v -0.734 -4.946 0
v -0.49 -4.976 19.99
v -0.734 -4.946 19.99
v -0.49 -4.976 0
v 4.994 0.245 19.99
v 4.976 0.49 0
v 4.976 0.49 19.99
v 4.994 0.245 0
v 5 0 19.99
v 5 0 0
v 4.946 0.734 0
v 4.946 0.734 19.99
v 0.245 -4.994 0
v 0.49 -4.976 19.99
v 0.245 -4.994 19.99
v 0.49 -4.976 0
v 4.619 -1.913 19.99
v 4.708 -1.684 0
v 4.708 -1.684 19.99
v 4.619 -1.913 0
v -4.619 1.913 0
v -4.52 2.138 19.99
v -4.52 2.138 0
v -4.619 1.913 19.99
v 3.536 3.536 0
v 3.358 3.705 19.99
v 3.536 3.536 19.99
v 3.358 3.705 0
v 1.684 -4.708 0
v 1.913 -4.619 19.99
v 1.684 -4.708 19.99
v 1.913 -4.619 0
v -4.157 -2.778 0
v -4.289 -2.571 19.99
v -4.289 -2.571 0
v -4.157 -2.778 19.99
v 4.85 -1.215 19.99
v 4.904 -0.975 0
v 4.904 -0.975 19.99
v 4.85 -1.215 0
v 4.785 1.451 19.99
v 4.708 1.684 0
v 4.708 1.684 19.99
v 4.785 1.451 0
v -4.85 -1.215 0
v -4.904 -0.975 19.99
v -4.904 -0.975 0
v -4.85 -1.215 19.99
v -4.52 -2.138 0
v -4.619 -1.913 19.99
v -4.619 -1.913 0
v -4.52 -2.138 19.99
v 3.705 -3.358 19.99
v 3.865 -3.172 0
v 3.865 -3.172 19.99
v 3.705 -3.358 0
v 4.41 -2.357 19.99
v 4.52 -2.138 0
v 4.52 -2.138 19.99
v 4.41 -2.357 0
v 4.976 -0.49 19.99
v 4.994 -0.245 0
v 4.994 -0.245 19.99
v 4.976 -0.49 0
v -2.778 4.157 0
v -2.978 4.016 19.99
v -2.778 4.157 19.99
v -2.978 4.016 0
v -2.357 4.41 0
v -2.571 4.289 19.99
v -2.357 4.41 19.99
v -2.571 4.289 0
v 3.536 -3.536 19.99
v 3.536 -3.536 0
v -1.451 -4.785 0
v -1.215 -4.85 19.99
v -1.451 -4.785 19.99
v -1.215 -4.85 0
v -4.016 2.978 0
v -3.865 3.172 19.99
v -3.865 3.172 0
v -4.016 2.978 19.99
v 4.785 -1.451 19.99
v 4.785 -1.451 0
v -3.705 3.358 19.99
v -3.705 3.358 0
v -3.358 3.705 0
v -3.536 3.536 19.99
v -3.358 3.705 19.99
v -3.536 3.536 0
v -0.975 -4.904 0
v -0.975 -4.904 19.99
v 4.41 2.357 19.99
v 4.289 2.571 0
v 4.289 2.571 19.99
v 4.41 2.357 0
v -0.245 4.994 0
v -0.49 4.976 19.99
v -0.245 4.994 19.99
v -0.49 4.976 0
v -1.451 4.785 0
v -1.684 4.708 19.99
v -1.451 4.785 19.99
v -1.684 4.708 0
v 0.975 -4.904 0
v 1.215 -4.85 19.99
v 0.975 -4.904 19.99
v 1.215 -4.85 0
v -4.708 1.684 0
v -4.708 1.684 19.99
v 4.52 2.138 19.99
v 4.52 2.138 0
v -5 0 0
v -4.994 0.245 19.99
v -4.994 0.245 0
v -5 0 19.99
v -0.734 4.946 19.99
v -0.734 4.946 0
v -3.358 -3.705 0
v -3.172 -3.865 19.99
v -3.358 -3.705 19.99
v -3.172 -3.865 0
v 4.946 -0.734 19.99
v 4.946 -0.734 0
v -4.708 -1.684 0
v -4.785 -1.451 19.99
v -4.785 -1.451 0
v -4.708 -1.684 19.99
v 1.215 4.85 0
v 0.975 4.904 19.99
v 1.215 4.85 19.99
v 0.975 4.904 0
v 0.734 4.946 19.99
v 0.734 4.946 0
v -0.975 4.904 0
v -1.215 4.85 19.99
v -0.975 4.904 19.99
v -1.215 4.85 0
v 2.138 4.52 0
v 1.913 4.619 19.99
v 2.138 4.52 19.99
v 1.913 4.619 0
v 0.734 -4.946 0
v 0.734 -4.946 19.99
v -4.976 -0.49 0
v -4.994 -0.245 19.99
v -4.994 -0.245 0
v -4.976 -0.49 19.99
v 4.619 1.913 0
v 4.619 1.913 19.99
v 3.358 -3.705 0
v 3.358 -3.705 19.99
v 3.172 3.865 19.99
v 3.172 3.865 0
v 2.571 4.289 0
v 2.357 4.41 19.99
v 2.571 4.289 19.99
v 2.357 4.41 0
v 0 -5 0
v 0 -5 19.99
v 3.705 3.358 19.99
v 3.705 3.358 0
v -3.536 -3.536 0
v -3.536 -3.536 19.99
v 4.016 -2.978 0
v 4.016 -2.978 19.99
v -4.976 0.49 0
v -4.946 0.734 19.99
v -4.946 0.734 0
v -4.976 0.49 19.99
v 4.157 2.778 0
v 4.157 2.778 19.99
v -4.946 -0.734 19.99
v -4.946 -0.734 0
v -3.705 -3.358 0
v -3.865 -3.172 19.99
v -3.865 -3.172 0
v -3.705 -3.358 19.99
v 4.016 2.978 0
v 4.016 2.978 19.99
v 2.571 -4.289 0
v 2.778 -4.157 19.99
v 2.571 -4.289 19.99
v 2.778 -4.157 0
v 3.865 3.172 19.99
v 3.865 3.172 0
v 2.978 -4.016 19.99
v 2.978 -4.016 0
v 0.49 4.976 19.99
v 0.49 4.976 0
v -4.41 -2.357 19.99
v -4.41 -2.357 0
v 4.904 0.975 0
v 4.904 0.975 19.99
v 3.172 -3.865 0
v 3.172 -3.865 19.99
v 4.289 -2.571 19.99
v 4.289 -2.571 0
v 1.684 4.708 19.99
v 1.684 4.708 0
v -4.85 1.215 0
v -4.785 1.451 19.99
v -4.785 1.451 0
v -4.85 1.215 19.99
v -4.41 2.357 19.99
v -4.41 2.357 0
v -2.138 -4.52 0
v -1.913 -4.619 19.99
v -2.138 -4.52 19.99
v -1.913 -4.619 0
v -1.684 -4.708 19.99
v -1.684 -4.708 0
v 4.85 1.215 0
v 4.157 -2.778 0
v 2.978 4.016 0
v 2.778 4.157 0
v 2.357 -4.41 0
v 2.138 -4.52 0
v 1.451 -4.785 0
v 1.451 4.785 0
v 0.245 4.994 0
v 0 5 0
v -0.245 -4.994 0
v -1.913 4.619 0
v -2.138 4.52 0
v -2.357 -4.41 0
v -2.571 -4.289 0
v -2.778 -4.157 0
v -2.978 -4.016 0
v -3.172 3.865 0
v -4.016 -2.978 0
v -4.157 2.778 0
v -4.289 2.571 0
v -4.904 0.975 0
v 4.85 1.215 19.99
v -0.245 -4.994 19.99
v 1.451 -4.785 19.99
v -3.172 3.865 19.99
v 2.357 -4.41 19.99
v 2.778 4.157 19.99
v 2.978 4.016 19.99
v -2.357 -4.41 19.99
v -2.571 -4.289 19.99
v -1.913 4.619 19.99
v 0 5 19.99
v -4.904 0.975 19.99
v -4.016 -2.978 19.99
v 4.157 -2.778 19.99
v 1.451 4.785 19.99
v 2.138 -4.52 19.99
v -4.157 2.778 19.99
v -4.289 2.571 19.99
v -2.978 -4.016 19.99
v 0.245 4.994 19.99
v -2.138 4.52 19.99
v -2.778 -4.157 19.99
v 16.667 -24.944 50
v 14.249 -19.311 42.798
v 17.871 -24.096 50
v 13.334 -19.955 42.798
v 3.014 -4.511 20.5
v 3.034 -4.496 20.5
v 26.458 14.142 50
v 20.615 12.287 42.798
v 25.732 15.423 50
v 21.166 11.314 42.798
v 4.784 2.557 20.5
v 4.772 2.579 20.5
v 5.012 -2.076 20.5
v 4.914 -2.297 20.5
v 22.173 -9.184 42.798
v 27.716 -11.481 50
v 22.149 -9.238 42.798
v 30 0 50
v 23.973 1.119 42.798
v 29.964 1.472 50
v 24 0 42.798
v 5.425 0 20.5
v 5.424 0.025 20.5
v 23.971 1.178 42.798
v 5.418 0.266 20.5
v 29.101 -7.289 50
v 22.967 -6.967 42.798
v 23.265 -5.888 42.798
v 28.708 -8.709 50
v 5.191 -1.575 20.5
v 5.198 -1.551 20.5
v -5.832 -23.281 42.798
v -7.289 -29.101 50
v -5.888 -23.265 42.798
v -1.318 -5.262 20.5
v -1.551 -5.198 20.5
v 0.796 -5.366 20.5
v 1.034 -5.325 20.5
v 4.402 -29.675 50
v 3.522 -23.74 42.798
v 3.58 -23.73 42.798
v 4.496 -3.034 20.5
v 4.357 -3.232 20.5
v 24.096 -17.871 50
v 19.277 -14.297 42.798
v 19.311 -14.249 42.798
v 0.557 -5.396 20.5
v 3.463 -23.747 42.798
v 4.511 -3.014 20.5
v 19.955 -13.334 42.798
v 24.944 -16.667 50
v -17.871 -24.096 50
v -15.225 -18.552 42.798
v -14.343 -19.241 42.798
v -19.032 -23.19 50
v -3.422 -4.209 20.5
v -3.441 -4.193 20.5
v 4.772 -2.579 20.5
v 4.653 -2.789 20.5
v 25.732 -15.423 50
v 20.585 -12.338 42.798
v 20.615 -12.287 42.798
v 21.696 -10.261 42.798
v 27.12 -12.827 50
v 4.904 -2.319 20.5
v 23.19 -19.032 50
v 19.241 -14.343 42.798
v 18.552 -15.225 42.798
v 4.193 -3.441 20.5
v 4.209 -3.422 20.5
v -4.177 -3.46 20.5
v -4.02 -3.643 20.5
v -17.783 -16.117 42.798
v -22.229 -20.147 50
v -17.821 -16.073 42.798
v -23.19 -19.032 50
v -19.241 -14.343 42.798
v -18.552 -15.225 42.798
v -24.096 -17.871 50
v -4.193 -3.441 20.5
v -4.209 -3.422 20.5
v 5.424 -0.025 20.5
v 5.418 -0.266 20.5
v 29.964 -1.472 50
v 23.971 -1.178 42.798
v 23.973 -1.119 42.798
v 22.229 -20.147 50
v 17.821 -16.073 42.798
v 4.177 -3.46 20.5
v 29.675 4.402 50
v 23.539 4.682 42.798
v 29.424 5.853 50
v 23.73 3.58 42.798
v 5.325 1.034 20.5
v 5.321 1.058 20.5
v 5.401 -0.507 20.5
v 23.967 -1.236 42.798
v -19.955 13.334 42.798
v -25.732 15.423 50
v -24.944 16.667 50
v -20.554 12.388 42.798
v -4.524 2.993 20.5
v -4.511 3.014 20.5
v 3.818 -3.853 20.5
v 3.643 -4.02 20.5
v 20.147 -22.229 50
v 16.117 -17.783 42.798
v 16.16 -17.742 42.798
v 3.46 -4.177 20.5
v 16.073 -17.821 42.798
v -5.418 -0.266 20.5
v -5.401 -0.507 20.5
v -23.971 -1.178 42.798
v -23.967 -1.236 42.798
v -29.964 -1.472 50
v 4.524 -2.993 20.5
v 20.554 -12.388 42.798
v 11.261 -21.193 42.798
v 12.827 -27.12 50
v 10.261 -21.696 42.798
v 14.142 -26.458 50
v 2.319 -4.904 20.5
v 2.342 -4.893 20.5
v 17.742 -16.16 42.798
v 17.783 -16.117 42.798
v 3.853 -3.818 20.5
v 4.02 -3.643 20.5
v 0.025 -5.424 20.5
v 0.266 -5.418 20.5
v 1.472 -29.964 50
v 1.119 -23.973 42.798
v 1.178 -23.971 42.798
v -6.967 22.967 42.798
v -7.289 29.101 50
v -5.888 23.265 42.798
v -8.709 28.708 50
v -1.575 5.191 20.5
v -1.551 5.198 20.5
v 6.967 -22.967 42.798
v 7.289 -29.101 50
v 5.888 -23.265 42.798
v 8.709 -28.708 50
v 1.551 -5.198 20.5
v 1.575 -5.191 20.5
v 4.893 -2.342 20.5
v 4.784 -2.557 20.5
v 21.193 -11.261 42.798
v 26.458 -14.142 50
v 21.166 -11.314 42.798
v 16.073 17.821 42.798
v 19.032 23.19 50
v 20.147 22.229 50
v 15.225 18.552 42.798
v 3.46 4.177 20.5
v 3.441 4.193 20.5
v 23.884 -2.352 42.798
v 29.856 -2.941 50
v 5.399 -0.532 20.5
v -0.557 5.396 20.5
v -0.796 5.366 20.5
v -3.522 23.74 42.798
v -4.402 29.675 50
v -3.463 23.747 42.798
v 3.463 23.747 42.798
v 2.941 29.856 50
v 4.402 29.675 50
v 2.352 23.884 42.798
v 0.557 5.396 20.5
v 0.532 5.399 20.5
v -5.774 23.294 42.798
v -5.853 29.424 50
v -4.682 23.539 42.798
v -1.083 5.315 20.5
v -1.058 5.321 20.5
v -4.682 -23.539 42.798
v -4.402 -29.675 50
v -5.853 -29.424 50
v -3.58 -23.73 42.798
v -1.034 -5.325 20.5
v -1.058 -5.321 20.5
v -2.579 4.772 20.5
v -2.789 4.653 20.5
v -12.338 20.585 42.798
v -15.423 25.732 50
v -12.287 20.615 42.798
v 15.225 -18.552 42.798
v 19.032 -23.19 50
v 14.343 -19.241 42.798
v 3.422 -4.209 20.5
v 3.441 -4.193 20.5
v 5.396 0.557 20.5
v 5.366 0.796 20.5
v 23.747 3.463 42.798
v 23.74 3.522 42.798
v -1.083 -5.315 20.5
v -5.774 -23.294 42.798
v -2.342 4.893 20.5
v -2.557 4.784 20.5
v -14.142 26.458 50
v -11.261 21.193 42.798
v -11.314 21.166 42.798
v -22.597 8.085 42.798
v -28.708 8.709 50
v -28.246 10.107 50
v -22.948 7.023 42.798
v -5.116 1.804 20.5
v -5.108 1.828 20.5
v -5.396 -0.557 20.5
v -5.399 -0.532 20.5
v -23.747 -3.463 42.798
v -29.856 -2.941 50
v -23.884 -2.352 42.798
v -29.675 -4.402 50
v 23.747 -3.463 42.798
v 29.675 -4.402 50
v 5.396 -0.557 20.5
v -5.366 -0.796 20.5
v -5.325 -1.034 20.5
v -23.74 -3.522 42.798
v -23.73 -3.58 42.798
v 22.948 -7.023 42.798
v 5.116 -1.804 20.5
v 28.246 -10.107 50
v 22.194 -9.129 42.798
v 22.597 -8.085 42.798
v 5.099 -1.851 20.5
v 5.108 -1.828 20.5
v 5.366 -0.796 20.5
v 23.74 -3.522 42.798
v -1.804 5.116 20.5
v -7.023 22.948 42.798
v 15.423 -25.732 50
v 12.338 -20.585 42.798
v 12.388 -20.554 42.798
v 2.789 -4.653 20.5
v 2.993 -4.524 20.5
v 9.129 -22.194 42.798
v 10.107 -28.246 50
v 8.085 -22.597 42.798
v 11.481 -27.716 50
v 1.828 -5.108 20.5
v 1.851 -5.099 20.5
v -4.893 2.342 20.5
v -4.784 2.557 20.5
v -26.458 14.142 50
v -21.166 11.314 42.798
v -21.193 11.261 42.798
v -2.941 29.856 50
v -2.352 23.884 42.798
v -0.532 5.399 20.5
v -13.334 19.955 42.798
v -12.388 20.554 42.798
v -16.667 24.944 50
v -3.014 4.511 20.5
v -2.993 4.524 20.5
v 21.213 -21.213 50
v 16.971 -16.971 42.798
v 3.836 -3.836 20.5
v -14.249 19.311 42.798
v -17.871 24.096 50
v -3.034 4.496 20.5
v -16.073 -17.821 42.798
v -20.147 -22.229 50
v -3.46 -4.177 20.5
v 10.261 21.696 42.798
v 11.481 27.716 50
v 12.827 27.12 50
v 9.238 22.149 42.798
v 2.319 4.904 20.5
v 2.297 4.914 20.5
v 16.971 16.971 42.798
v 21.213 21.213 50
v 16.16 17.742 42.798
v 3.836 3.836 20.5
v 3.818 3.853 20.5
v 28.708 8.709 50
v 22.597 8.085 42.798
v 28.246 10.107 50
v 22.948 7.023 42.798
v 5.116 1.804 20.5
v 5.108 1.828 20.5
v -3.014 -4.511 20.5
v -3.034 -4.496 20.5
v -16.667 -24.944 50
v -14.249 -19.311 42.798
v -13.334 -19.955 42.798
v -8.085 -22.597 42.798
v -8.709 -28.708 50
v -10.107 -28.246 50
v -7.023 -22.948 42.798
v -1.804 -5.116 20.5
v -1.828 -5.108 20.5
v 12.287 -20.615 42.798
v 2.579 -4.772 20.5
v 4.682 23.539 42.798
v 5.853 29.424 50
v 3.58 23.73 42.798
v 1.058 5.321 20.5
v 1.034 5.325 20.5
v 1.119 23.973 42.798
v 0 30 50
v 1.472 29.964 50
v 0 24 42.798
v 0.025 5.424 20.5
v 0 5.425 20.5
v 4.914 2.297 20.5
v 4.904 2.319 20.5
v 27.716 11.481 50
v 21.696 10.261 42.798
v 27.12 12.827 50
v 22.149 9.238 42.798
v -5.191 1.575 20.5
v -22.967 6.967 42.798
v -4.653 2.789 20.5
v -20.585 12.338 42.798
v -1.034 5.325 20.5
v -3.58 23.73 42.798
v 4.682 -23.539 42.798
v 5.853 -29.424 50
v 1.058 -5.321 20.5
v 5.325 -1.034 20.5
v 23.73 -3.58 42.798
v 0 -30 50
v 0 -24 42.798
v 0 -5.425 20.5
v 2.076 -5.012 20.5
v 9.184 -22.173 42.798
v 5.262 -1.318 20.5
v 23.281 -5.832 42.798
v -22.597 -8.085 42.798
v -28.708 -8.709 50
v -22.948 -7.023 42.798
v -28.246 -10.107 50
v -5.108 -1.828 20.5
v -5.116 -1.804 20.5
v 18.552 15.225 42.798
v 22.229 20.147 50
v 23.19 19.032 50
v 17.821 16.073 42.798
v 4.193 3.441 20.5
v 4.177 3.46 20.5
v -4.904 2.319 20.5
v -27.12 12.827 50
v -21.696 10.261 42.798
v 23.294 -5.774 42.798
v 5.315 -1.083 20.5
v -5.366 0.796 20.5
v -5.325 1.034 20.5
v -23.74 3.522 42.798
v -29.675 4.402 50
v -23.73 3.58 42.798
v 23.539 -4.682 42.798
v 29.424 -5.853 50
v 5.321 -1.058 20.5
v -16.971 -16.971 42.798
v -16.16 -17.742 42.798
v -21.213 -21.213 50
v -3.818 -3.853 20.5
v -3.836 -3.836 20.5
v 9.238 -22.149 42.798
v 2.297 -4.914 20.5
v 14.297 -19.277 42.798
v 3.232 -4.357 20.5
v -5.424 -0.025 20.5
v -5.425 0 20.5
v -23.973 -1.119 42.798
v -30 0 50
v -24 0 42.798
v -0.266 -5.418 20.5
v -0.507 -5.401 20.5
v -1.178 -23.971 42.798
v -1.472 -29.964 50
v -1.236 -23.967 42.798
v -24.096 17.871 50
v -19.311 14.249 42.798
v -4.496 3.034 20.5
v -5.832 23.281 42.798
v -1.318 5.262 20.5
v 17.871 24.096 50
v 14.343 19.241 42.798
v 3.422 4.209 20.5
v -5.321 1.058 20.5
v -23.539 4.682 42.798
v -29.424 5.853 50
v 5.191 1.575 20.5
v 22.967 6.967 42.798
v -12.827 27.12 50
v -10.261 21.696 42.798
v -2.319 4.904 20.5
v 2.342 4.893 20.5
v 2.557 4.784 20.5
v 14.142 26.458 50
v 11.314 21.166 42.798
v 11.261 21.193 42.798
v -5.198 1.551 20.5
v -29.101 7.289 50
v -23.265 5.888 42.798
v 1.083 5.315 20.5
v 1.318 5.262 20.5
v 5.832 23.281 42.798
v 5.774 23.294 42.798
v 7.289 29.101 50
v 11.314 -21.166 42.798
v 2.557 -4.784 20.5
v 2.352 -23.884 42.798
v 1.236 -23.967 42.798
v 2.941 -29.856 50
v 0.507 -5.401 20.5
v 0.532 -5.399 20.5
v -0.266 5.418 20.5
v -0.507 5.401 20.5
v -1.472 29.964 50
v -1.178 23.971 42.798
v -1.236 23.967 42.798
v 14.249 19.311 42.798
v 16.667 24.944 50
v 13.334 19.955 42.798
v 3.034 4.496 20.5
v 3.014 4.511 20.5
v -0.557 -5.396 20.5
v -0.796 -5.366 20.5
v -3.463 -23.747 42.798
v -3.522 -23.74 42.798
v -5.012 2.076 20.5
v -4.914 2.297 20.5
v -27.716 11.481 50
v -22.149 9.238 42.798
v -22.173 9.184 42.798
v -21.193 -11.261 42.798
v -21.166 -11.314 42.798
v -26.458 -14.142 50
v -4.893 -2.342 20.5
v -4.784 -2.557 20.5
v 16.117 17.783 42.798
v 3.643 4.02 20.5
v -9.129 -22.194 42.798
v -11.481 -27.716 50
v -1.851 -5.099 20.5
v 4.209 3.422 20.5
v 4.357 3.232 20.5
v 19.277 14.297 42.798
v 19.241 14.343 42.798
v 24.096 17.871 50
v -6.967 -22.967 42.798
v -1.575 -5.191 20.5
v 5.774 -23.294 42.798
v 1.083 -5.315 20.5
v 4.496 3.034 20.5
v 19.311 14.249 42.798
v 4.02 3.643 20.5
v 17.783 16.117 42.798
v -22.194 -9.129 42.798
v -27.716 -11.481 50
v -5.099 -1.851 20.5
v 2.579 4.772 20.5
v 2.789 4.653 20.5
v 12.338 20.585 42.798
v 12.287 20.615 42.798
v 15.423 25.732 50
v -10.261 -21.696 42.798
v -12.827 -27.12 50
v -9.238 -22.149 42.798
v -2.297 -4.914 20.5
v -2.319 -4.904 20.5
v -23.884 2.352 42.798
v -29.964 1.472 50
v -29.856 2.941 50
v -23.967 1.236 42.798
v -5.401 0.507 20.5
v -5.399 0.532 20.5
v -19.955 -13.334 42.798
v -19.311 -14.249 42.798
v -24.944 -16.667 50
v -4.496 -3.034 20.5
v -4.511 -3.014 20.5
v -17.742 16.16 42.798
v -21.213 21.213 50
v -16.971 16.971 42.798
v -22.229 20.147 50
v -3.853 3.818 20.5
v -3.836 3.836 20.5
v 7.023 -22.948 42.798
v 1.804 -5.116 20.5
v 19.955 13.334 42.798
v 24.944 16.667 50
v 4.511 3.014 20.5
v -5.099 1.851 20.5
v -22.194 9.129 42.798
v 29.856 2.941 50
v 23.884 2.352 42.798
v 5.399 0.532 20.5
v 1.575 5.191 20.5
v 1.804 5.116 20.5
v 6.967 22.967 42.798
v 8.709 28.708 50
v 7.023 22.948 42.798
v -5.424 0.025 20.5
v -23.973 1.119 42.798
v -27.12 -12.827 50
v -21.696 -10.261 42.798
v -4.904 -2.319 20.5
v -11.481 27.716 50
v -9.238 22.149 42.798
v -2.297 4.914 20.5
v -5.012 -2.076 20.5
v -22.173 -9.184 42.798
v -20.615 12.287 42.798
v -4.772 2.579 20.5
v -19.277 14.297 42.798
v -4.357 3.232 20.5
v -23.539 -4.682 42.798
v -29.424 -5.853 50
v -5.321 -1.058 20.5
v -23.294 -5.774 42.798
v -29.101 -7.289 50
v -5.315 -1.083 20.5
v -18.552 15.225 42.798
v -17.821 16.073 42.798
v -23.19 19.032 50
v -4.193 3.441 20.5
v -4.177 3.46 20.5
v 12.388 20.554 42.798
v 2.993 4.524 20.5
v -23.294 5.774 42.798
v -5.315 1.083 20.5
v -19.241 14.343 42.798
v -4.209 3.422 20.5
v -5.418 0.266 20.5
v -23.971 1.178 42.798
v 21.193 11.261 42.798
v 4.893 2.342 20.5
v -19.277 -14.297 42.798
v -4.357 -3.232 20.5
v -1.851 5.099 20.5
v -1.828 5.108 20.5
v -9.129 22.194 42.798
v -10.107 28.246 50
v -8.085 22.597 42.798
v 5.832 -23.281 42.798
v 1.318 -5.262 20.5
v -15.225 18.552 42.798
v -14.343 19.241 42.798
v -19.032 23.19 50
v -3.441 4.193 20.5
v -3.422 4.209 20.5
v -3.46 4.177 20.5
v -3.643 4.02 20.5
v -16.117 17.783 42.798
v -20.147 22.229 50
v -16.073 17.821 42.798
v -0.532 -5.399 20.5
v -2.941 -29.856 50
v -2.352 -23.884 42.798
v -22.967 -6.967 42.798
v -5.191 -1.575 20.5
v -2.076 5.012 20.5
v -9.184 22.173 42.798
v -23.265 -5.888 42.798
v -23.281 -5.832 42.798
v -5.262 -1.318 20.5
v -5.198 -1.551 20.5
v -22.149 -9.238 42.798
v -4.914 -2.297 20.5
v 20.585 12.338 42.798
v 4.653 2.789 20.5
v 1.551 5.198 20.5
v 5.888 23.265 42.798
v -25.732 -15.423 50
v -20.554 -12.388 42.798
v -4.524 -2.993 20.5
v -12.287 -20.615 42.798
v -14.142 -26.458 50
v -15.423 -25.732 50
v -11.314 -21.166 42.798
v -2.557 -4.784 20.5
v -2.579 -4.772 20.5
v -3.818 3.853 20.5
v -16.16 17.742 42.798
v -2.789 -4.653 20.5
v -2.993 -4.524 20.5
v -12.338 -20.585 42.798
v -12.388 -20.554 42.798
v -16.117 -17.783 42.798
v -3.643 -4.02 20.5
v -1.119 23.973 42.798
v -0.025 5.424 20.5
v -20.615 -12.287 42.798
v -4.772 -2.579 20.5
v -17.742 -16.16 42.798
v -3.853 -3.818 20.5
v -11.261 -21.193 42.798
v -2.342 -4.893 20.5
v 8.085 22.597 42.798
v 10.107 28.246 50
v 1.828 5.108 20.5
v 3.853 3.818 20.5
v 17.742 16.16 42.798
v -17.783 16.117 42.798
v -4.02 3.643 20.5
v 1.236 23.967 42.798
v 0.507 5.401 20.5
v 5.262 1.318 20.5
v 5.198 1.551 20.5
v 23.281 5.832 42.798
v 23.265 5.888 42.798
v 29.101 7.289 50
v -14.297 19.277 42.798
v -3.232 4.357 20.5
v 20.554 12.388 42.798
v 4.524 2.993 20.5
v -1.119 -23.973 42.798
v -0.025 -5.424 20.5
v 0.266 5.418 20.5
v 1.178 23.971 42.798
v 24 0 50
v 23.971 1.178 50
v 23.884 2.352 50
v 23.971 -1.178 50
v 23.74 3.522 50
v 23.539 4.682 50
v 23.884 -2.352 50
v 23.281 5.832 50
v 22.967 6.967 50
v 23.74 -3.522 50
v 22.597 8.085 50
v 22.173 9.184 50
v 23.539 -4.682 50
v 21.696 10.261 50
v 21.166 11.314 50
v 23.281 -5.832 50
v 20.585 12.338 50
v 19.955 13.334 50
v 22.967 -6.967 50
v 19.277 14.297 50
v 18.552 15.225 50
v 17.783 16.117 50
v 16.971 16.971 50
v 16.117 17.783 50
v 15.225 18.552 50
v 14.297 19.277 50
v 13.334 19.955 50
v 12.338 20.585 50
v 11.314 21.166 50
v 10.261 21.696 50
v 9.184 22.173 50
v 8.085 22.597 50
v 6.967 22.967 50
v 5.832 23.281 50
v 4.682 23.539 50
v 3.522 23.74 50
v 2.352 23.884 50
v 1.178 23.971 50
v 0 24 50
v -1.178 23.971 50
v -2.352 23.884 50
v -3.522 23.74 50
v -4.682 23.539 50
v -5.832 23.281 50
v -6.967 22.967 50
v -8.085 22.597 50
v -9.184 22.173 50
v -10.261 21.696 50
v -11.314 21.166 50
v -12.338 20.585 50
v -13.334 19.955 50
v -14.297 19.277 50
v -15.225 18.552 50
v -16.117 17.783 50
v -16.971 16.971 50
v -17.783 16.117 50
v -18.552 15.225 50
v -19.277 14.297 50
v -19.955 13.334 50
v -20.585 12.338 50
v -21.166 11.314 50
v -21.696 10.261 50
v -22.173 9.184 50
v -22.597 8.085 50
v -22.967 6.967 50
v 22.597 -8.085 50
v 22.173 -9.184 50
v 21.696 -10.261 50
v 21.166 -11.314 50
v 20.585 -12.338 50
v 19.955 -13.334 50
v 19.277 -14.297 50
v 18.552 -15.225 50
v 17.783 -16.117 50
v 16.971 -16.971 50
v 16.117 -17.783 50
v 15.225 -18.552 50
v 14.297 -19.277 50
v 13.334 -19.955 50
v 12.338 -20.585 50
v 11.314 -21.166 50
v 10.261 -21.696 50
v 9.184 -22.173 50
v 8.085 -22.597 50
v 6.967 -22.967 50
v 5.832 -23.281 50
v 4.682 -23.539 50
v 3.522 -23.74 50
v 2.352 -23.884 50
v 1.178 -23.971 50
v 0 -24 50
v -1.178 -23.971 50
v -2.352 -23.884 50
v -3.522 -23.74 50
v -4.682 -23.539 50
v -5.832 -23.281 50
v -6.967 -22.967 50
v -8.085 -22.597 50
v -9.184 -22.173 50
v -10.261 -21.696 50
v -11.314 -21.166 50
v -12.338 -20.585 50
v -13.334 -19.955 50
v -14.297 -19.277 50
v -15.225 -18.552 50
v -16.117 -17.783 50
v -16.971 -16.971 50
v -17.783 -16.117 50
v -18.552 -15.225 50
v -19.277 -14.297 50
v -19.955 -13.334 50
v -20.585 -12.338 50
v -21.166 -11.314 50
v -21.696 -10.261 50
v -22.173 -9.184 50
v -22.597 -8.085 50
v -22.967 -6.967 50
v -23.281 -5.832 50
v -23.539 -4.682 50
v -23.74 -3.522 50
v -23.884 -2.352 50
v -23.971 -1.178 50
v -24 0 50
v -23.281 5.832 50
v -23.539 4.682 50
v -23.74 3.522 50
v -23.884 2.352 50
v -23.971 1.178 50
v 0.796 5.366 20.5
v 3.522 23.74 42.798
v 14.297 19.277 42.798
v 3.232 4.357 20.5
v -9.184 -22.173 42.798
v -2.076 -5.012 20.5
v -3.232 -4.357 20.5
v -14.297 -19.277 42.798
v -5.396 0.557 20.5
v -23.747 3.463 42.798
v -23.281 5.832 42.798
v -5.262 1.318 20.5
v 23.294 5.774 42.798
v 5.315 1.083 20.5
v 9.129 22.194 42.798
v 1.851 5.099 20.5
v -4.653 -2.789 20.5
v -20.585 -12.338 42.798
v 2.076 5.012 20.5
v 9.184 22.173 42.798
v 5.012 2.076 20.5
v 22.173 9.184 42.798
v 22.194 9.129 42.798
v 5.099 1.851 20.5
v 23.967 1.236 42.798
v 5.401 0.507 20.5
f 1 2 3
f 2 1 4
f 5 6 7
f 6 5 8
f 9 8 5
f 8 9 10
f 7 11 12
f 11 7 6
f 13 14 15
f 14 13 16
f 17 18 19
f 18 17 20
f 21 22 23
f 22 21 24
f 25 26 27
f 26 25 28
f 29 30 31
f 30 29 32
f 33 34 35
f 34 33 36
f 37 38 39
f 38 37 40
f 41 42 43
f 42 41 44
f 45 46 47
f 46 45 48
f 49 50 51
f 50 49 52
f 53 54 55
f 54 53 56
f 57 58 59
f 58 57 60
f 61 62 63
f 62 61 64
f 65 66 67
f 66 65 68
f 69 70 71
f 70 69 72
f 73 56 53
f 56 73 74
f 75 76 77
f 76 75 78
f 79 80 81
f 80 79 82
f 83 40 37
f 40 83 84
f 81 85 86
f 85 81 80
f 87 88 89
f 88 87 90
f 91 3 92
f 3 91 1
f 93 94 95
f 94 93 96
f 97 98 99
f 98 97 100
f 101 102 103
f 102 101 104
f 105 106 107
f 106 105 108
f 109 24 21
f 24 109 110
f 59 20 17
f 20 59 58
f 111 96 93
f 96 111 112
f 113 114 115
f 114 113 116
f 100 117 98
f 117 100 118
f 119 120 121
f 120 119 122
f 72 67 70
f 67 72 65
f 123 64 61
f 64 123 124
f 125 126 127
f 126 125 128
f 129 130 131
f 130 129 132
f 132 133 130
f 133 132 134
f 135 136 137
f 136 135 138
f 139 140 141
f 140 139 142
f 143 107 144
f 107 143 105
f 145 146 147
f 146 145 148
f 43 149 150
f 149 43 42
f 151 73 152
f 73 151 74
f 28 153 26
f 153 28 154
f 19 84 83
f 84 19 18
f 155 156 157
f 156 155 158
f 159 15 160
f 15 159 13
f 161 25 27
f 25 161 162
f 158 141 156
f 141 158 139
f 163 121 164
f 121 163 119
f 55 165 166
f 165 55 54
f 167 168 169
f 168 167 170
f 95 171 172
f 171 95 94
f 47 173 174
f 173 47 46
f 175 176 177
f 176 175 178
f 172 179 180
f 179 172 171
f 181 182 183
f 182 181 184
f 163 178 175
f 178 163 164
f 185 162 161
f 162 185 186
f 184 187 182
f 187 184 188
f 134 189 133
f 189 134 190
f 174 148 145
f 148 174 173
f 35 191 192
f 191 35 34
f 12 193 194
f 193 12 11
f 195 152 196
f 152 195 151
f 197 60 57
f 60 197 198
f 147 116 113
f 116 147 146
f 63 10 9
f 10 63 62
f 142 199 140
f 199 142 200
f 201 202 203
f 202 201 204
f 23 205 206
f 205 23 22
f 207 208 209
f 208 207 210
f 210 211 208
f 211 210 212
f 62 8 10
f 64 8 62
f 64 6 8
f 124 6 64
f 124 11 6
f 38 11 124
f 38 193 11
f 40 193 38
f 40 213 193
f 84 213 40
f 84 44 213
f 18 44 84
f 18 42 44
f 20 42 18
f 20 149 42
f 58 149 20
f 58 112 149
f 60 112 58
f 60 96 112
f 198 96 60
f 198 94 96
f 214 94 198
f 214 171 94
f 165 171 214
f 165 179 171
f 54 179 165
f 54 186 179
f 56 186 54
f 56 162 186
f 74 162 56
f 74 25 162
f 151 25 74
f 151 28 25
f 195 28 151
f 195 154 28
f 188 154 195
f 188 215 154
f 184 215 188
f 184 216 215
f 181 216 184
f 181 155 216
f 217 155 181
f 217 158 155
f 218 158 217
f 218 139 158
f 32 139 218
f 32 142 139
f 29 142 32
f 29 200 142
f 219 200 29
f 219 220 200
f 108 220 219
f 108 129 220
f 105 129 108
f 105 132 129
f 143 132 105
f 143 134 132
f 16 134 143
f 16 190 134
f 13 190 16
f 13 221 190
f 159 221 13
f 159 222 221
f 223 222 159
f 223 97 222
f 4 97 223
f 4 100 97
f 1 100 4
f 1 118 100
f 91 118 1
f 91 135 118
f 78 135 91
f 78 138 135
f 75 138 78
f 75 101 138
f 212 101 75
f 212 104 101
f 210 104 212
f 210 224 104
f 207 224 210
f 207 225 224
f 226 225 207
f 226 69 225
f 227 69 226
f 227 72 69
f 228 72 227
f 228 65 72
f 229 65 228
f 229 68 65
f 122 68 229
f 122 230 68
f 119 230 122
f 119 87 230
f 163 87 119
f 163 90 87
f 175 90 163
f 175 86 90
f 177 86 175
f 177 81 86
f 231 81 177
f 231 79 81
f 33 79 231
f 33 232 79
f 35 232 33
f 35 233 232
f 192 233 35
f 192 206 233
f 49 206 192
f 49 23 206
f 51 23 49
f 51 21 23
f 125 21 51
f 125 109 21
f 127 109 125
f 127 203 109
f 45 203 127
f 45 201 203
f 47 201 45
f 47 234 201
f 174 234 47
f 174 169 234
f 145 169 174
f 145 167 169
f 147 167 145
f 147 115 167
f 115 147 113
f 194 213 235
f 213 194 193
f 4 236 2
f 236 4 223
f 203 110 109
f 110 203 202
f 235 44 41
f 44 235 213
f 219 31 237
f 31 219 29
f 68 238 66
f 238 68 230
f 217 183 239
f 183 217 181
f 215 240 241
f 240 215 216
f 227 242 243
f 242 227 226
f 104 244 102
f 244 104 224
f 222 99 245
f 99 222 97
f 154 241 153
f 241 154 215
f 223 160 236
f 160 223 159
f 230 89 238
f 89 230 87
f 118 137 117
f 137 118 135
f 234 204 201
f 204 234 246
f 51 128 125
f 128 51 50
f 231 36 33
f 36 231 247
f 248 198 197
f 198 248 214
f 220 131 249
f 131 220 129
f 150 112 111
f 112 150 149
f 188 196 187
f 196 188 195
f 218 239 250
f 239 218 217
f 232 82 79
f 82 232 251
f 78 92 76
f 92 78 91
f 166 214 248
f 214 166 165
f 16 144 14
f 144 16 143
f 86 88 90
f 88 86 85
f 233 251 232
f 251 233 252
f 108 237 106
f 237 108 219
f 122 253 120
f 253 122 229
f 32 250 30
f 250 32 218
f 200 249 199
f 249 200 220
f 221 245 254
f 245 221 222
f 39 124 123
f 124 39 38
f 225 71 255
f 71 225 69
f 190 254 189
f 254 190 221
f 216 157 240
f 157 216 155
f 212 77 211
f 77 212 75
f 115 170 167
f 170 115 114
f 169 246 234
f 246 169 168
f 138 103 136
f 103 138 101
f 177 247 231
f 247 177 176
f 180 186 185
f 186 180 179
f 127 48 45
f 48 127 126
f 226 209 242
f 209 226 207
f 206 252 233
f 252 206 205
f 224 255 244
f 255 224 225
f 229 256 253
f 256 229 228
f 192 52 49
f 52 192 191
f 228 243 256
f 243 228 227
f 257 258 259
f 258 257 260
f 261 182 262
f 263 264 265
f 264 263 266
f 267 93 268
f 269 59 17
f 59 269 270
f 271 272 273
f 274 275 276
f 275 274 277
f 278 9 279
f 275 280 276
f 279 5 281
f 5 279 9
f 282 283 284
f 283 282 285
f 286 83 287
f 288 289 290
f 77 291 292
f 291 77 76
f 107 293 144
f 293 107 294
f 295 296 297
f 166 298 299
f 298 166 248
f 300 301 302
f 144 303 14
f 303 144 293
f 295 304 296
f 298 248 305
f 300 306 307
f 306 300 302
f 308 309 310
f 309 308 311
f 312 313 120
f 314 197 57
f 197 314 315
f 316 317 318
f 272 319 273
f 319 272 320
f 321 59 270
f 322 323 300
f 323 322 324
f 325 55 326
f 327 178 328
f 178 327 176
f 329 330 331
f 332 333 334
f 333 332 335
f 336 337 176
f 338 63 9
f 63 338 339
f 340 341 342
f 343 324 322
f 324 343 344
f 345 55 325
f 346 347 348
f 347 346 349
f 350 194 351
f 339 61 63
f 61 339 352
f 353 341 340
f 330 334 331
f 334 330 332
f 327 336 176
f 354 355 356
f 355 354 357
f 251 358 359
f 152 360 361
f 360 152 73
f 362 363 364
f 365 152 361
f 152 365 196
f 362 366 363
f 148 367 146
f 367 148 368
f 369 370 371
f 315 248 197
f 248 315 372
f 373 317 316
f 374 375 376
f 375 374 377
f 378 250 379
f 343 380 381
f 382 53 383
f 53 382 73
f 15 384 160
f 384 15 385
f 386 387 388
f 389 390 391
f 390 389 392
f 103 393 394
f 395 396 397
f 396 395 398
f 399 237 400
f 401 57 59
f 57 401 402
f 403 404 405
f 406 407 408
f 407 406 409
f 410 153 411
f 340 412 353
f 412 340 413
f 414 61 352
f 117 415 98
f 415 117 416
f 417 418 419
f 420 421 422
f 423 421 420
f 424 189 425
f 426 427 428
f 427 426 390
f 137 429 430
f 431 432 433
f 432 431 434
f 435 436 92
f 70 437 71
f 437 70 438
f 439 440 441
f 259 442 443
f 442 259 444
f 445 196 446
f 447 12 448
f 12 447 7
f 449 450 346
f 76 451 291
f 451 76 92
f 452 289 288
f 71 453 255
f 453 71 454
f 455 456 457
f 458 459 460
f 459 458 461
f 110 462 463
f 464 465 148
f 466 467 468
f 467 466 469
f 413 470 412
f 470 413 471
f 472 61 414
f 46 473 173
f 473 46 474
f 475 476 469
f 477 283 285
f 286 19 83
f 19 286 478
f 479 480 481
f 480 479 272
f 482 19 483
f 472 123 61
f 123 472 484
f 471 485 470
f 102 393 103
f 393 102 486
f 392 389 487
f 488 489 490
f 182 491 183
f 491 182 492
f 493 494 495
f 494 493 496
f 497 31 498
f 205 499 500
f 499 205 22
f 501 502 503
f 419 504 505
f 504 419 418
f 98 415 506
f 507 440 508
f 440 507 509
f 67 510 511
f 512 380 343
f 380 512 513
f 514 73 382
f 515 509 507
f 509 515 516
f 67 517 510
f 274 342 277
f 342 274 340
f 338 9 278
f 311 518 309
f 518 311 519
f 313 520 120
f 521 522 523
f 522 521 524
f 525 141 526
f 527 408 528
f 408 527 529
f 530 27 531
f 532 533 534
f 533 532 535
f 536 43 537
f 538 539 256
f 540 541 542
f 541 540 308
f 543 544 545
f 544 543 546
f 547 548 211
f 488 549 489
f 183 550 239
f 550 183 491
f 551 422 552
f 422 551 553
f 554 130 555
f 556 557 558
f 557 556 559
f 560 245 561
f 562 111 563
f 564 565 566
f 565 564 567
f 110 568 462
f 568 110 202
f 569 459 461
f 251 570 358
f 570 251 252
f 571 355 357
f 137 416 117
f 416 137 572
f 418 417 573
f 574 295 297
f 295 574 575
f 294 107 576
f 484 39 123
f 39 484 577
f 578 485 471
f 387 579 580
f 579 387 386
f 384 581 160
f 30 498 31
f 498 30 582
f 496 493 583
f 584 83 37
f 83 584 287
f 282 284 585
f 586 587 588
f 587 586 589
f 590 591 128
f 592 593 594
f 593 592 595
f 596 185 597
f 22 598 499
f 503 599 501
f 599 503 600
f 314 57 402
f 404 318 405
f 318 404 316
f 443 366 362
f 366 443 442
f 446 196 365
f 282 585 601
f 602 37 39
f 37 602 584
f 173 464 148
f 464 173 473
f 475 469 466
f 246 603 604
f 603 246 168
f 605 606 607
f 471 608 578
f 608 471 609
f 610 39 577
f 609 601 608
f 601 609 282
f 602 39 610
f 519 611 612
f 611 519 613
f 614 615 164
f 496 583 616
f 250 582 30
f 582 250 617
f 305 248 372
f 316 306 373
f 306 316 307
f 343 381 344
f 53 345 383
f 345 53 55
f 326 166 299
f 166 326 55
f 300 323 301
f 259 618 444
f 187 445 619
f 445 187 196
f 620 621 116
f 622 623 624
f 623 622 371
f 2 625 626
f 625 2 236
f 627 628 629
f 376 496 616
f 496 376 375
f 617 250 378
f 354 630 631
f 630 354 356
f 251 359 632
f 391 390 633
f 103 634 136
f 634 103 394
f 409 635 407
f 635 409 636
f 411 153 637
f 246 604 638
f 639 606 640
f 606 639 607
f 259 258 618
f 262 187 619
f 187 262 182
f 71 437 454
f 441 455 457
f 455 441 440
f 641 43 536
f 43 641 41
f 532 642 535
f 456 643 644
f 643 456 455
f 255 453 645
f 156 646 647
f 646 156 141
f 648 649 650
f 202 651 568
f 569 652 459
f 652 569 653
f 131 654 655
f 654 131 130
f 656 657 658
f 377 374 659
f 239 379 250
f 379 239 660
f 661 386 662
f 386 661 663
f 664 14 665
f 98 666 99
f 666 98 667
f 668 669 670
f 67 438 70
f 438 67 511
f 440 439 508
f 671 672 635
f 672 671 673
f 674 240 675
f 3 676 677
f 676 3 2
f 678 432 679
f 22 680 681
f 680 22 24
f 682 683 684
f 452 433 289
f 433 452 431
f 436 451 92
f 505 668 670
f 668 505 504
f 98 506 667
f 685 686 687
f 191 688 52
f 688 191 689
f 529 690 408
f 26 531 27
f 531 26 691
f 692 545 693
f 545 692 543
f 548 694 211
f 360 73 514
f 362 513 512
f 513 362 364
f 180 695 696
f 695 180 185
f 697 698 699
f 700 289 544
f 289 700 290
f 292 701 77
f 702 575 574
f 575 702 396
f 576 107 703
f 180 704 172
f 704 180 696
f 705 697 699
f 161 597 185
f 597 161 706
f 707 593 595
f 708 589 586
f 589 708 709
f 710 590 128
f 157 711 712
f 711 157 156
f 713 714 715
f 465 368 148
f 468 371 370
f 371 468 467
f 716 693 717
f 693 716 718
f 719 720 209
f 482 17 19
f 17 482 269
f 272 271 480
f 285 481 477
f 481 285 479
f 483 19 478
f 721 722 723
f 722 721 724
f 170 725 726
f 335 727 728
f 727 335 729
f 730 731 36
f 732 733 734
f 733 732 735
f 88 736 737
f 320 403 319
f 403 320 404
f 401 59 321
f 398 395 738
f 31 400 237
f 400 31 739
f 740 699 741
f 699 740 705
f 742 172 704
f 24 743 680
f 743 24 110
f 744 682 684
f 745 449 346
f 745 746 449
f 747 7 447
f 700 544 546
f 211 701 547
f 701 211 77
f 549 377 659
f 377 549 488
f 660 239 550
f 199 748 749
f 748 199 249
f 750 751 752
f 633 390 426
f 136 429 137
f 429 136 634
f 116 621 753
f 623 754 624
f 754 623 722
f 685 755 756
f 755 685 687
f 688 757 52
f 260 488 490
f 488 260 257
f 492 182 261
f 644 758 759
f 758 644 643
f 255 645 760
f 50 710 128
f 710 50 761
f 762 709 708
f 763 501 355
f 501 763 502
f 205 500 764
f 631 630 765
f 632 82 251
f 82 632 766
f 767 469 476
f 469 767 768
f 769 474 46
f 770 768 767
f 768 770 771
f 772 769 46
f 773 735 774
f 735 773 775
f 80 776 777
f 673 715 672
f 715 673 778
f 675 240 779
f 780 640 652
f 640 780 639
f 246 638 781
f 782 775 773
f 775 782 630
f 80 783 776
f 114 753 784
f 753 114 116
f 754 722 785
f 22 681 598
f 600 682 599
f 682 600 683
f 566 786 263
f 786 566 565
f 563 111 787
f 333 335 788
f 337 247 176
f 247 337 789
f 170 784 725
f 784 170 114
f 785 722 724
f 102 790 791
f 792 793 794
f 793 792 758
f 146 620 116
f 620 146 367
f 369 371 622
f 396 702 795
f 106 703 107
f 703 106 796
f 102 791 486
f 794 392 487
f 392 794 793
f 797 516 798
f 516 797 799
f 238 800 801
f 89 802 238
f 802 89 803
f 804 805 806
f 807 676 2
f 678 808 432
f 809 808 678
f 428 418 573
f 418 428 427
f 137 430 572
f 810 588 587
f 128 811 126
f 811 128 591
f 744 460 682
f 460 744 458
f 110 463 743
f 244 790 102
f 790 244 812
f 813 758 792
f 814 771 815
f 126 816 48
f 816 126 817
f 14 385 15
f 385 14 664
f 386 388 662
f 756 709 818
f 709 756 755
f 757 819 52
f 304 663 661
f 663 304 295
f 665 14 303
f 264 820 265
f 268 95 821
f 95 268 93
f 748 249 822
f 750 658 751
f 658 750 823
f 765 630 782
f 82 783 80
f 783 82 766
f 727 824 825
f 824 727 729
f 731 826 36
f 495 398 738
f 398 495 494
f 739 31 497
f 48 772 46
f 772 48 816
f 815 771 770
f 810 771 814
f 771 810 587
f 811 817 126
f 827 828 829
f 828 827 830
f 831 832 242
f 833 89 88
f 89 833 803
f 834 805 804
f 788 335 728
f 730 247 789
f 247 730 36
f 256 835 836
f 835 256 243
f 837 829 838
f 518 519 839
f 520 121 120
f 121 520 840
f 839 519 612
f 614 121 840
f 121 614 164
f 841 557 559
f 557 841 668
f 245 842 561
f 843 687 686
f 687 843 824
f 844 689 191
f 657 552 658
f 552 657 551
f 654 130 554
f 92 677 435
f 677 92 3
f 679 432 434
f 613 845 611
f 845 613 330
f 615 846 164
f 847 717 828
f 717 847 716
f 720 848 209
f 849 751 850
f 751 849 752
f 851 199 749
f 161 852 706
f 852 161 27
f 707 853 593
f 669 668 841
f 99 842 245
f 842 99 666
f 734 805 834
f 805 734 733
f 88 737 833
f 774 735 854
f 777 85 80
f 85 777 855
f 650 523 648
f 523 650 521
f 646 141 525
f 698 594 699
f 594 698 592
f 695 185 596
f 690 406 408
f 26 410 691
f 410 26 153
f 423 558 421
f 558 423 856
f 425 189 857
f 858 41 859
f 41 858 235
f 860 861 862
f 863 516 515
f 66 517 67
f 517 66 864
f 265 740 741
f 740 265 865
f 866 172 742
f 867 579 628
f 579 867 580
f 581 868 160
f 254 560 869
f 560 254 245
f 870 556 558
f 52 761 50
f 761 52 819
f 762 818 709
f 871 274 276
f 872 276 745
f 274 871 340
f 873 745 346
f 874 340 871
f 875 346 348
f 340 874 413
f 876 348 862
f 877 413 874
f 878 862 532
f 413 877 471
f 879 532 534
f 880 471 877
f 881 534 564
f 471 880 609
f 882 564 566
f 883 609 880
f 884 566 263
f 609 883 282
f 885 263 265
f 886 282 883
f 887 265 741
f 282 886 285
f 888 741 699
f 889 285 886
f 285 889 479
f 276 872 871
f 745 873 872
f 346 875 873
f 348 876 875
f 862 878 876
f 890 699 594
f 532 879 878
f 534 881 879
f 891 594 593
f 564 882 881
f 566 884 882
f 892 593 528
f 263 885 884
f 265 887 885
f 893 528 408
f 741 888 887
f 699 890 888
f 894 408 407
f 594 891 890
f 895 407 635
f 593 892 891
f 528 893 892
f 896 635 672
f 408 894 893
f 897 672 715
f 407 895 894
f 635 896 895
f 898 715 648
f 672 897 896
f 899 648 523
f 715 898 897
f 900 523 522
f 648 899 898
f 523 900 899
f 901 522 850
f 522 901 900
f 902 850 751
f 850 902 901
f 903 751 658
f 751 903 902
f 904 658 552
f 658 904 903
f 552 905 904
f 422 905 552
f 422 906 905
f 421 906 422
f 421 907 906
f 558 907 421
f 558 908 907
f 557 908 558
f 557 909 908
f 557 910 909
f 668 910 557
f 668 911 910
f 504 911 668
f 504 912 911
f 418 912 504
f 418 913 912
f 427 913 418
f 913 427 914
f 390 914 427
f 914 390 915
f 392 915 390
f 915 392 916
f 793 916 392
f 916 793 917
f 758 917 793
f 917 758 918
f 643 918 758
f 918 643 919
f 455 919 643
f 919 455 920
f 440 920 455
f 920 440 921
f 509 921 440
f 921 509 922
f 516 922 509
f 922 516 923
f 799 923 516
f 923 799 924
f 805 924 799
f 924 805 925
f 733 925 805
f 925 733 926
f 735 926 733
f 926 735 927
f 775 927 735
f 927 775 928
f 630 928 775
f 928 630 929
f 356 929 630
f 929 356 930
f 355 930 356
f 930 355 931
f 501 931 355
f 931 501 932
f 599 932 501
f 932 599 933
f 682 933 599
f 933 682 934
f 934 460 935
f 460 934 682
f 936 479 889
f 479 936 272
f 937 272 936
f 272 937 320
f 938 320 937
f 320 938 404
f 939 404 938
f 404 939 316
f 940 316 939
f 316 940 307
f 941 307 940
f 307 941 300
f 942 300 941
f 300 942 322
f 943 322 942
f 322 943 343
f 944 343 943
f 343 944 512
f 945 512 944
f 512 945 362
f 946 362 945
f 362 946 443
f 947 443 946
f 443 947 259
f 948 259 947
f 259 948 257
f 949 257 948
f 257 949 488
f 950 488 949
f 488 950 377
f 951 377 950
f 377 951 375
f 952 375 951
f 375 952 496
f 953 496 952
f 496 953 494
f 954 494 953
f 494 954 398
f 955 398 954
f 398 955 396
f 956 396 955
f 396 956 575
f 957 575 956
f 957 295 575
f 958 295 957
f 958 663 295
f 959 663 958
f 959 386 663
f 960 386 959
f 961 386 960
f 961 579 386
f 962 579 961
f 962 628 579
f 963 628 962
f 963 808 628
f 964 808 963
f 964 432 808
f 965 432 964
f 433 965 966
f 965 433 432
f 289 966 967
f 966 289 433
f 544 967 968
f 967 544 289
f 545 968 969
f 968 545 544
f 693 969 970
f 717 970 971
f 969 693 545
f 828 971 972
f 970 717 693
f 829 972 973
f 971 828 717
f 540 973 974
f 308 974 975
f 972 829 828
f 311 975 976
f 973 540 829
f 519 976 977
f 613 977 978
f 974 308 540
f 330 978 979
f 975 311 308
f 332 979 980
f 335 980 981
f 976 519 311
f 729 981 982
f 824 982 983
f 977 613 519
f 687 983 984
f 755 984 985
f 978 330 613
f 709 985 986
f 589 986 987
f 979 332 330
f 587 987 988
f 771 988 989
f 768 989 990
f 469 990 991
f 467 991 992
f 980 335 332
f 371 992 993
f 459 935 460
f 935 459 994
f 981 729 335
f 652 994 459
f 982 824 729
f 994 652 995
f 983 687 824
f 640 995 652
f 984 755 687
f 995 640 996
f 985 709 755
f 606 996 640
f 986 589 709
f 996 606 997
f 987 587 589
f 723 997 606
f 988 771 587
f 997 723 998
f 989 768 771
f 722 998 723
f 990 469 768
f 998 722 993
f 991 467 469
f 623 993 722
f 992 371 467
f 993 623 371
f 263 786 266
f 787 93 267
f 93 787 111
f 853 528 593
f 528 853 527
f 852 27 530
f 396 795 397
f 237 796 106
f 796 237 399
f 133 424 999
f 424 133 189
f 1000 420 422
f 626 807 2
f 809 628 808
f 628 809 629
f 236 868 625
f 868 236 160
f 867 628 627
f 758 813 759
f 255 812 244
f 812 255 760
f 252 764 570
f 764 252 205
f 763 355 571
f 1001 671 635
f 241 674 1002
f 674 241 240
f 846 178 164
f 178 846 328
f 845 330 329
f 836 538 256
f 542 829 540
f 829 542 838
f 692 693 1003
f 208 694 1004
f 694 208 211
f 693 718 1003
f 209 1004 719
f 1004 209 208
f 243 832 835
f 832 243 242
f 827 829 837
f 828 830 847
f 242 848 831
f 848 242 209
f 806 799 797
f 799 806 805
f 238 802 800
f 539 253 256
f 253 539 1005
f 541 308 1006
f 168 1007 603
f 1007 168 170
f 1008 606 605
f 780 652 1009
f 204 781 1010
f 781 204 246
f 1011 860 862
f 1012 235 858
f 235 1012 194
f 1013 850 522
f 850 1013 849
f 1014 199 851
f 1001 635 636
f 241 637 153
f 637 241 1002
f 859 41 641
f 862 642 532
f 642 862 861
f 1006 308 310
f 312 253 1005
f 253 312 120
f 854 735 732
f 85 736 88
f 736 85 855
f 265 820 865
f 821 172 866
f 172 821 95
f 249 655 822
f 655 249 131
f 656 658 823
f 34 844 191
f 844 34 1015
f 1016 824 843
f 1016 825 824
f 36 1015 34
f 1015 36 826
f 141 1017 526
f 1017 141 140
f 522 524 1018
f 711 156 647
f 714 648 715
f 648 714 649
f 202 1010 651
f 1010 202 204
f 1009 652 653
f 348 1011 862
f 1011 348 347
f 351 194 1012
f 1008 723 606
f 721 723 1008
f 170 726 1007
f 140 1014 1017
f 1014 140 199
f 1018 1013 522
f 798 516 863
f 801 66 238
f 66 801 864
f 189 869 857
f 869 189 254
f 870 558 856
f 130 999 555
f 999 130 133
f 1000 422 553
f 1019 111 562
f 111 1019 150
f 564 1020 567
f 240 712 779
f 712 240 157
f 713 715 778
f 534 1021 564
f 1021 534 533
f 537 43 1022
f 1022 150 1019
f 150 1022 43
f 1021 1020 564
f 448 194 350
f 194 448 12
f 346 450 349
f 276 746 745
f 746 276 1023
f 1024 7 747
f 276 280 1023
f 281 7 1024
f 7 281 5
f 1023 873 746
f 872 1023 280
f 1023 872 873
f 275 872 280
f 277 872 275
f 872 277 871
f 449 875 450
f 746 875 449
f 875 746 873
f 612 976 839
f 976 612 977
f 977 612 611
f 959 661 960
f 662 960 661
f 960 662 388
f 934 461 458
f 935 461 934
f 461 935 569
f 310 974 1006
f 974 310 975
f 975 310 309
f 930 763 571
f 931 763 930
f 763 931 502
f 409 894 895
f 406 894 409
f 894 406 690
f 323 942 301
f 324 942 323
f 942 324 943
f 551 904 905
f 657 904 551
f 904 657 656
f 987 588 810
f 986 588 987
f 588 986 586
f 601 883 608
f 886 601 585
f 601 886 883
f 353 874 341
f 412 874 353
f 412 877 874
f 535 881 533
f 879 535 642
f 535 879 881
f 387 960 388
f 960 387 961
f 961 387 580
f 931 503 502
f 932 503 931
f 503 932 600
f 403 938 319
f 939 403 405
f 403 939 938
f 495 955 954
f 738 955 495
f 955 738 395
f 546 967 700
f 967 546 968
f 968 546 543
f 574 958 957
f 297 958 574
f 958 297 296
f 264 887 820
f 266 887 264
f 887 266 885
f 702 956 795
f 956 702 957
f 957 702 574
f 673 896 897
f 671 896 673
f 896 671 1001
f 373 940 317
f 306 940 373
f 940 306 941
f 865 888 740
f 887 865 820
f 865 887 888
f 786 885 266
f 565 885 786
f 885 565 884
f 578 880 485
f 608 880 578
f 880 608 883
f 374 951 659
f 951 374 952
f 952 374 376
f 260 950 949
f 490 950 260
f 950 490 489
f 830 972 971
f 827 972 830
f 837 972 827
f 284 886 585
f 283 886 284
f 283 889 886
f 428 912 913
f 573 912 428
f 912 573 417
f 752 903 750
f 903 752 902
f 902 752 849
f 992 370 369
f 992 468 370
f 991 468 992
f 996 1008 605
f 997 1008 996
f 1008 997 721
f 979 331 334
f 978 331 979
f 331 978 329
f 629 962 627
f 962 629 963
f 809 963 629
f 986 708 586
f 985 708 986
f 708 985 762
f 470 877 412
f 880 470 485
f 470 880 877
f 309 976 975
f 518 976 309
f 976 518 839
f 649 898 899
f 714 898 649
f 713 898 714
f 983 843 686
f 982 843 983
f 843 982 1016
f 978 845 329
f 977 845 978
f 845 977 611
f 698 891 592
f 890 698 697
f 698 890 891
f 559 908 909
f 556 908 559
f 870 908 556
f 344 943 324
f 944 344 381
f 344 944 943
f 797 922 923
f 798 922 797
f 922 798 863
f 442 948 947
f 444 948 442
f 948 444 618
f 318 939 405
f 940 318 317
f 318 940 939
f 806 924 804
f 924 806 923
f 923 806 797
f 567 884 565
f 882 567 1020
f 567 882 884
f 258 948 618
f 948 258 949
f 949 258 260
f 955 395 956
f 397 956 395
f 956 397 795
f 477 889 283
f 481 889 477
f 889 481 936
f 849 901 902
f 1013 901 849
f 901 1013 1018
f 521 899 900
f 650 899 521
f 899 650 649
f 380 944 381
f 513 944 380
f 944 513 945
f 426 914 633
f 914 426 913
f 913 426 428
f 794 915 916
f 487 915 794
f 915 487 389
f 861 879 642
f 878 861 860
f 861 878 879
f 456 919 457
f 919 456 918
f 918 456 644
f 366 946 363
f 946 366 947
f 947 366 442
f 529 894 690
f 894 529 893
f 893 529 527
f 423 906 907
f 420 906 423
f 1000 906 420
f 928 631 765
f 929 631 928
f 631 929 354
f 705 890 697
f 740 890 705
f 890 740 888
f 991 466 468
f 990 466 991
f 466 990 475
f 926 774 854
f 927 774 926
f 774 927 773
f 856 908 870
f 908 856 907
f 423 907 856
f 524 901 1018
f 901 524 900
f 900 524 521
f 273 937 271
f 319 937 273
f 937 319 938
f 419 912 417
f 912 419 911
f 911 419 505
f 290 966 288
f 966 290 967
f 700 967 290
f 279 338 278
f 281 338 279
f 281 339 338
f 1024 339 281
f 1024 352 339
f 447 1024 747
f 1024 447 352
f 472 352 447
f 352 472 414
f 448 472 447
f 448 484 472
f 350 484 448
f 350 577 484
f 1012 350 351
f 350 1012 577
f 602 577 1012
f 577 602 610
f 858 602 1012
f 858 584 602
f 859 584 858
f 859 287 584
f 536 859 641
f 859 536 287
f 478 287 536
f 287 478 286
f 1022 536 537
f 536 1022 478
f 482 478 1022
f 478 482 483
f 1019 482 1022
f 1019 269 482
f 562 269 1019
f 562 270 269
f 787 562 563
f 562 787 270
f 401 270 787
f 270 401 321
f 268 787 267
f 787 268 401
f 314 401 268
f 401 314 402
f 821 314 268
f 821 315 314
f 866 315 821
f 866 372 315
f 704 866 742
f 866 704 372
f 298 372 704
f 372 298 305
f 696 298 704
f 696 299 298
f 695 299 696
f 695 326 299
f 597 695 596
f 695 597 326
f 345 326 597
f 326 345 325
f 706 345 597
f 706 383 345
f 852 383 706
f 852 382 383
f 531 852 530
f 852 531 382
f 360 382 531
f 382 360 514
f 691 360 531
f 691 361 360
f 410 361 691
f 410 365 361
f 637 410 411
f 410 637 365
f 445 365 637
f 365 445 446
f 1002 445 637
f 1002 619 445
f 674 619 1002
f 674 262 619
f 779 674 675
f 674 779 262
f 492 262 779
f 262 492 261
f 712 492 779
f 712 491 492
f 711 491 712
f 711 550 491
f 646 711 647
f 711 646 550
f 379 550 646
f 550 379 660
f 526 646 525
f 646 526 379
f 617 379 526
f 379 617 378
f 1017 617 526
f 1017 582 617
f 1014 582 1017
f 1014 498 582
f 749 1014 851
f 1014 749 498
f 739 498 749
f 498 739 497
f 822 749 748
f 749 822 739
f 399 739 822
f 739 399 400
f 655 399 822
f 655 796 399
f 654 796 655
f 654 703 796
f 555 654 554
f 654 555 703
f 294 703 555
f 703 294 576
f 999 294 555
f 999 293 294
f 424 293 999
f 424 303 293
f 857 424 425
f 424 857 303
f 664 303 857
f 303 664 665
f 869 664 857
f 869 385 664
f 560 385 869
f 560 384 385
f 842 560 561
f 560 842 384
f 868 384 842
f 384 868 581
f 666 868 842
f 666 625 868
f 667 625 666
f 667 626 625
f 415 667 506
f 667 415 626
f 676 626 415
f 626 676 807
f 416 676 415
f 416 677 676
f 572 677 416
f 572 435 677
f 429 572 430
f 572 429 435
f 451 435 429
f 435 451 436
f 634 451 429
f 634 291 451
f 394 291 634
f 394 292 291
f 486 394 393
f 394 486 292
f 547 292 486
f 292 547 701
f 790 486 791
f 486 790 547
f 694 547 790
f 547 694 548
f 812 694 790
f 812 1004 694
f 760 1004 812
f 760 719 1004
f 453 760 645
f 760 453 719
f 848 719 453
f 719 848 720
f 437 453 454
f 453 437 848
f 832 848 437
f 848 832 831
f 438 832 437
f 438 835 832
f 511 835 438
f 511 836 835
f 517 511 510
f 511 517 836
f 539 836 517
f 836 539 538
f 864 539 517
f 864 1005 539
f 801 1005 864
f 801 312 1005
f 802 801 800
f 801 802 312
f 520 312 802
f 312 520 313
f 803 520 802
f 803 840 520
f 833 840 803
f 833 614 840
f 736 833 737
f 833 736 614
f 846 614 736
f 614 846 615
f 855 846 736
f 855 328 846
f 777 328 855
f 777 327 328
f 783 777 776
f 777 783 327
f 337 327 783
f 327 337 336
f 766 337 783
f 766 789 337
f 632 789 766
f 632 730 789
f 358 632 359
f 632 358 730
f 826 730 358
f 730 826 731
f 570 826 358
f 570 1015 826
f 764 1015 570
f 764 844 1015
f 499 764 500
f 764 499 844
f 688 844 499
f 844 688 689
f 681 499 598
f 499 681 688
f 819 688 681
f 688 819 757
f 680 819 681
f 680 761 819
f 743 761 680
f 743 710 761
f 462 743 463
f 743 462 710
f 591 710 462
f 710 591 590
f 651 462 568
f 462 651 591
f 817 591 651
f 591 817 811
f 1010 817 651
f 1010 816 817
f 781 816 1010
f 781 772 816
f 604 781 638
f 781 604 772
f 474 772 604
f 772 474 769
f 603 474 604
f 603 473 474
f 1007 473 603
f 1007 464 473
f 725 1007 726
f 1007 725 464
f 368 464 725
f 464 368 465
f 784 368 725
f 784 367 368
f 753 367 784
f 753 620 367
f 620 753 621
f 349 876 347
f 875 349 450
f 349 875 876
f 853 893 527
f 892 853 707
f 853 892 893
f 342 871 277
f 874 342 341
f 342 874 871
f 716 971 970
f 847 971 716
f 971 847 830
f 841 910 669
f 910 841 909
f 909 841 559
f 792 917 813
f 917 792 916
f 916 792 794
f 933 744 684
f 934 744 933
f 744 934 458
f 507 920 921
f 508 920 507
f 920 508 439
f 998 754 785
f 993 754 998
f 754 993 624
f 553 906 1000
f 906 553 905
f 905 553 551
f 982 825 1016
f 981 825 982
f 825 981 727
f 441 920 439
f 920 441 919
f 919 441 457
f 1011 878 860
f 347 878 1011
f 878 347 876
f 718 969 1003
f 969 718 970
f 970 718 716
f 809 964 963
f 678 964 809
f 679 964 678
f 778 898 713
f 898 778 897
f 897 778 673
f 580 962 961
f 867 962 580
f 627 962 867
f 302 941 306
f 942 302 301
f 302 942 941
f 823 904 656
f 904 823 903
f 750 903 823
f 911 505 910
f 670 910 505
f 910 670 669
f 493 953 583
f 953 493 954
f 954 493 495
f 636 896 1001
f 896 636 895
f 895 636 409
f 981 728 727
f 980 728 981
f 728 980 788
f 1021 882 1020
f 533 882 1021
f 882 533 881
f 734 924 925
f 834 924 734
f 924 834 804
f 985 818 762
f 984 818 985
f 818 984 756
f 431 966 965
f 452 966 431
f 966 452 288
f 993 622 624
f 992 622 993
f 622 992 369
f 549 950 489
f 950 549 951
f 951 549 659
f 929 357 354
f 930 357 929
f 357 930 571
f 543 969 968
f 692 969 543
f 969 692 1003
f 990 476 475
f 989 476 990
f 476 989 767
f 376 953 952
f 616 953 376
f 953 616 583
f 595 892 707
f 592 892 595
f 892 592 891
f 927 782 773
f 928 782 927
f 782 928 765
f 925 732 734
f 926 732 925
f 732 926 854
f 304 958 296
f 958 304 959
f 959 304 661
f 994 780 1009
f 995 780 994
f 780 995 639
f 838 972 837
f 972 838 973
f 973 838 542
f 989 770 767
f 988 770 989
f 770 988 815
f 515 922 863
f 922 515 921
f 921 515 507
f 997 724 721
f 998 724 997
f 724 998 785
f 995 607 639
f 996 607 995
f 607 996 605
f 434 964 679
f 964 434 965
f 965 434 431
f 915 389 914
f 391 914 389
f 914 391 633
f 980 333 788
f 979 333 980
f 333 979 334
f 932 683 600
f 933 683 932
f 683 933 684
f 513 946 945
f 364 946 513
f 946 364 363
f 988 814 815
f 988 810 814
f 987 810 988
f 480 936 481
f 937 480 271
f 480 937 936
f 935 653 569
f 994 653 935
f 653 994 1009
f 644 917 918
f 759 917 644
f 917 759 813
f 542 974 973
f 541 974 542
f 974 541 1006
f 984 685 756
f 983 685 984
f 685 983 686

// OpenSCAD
// Lab funnel - printed upright, open at top and bottom
// Units: mm

// ---- Parameters ----
spout_od      = 10;    // spout outer diameter
spout_h       = 20;    // spout height (z = 0 to 20)
cone_od_top   = 60;    // cone rim outer diameter (z = 50)
cone_h        = 30;    // cone height (z = 20 to 50)
wall          = 1.6;   // wall thickness everywhere
eps           = 0.5;   // cutter overshoot past faces

$fn = 128;

// ---- Derived ----
spout_id = spout_od - 2 * wall;   // bore diameter (6.8 mm)

// ---- Model ----
difference() {
    union() {
        // Spout (tube)
        cylinder(d = spout_od, h = spout_h);
        // Cone, overlapped slightly into spout for a clean union
        translate([0, 0, spout_h - 0.01])
            cylinder(d1 = spout_od, d2 = cone_od_top, h = cone_h + 0.01);
    }
    // Through-bore: spout bore up to cone start, then cone tip to rim
    translate([0, 0, spout_h + 0.5])
        cylinder(d = cone_od_top * 0.8, h = cone_h - 0.5);   // tip at z = 29.5
    // Bottom cutter past spout base
    translate([0, 0, -eps])
        cylinder(d = spout_od, h = eps);
}
